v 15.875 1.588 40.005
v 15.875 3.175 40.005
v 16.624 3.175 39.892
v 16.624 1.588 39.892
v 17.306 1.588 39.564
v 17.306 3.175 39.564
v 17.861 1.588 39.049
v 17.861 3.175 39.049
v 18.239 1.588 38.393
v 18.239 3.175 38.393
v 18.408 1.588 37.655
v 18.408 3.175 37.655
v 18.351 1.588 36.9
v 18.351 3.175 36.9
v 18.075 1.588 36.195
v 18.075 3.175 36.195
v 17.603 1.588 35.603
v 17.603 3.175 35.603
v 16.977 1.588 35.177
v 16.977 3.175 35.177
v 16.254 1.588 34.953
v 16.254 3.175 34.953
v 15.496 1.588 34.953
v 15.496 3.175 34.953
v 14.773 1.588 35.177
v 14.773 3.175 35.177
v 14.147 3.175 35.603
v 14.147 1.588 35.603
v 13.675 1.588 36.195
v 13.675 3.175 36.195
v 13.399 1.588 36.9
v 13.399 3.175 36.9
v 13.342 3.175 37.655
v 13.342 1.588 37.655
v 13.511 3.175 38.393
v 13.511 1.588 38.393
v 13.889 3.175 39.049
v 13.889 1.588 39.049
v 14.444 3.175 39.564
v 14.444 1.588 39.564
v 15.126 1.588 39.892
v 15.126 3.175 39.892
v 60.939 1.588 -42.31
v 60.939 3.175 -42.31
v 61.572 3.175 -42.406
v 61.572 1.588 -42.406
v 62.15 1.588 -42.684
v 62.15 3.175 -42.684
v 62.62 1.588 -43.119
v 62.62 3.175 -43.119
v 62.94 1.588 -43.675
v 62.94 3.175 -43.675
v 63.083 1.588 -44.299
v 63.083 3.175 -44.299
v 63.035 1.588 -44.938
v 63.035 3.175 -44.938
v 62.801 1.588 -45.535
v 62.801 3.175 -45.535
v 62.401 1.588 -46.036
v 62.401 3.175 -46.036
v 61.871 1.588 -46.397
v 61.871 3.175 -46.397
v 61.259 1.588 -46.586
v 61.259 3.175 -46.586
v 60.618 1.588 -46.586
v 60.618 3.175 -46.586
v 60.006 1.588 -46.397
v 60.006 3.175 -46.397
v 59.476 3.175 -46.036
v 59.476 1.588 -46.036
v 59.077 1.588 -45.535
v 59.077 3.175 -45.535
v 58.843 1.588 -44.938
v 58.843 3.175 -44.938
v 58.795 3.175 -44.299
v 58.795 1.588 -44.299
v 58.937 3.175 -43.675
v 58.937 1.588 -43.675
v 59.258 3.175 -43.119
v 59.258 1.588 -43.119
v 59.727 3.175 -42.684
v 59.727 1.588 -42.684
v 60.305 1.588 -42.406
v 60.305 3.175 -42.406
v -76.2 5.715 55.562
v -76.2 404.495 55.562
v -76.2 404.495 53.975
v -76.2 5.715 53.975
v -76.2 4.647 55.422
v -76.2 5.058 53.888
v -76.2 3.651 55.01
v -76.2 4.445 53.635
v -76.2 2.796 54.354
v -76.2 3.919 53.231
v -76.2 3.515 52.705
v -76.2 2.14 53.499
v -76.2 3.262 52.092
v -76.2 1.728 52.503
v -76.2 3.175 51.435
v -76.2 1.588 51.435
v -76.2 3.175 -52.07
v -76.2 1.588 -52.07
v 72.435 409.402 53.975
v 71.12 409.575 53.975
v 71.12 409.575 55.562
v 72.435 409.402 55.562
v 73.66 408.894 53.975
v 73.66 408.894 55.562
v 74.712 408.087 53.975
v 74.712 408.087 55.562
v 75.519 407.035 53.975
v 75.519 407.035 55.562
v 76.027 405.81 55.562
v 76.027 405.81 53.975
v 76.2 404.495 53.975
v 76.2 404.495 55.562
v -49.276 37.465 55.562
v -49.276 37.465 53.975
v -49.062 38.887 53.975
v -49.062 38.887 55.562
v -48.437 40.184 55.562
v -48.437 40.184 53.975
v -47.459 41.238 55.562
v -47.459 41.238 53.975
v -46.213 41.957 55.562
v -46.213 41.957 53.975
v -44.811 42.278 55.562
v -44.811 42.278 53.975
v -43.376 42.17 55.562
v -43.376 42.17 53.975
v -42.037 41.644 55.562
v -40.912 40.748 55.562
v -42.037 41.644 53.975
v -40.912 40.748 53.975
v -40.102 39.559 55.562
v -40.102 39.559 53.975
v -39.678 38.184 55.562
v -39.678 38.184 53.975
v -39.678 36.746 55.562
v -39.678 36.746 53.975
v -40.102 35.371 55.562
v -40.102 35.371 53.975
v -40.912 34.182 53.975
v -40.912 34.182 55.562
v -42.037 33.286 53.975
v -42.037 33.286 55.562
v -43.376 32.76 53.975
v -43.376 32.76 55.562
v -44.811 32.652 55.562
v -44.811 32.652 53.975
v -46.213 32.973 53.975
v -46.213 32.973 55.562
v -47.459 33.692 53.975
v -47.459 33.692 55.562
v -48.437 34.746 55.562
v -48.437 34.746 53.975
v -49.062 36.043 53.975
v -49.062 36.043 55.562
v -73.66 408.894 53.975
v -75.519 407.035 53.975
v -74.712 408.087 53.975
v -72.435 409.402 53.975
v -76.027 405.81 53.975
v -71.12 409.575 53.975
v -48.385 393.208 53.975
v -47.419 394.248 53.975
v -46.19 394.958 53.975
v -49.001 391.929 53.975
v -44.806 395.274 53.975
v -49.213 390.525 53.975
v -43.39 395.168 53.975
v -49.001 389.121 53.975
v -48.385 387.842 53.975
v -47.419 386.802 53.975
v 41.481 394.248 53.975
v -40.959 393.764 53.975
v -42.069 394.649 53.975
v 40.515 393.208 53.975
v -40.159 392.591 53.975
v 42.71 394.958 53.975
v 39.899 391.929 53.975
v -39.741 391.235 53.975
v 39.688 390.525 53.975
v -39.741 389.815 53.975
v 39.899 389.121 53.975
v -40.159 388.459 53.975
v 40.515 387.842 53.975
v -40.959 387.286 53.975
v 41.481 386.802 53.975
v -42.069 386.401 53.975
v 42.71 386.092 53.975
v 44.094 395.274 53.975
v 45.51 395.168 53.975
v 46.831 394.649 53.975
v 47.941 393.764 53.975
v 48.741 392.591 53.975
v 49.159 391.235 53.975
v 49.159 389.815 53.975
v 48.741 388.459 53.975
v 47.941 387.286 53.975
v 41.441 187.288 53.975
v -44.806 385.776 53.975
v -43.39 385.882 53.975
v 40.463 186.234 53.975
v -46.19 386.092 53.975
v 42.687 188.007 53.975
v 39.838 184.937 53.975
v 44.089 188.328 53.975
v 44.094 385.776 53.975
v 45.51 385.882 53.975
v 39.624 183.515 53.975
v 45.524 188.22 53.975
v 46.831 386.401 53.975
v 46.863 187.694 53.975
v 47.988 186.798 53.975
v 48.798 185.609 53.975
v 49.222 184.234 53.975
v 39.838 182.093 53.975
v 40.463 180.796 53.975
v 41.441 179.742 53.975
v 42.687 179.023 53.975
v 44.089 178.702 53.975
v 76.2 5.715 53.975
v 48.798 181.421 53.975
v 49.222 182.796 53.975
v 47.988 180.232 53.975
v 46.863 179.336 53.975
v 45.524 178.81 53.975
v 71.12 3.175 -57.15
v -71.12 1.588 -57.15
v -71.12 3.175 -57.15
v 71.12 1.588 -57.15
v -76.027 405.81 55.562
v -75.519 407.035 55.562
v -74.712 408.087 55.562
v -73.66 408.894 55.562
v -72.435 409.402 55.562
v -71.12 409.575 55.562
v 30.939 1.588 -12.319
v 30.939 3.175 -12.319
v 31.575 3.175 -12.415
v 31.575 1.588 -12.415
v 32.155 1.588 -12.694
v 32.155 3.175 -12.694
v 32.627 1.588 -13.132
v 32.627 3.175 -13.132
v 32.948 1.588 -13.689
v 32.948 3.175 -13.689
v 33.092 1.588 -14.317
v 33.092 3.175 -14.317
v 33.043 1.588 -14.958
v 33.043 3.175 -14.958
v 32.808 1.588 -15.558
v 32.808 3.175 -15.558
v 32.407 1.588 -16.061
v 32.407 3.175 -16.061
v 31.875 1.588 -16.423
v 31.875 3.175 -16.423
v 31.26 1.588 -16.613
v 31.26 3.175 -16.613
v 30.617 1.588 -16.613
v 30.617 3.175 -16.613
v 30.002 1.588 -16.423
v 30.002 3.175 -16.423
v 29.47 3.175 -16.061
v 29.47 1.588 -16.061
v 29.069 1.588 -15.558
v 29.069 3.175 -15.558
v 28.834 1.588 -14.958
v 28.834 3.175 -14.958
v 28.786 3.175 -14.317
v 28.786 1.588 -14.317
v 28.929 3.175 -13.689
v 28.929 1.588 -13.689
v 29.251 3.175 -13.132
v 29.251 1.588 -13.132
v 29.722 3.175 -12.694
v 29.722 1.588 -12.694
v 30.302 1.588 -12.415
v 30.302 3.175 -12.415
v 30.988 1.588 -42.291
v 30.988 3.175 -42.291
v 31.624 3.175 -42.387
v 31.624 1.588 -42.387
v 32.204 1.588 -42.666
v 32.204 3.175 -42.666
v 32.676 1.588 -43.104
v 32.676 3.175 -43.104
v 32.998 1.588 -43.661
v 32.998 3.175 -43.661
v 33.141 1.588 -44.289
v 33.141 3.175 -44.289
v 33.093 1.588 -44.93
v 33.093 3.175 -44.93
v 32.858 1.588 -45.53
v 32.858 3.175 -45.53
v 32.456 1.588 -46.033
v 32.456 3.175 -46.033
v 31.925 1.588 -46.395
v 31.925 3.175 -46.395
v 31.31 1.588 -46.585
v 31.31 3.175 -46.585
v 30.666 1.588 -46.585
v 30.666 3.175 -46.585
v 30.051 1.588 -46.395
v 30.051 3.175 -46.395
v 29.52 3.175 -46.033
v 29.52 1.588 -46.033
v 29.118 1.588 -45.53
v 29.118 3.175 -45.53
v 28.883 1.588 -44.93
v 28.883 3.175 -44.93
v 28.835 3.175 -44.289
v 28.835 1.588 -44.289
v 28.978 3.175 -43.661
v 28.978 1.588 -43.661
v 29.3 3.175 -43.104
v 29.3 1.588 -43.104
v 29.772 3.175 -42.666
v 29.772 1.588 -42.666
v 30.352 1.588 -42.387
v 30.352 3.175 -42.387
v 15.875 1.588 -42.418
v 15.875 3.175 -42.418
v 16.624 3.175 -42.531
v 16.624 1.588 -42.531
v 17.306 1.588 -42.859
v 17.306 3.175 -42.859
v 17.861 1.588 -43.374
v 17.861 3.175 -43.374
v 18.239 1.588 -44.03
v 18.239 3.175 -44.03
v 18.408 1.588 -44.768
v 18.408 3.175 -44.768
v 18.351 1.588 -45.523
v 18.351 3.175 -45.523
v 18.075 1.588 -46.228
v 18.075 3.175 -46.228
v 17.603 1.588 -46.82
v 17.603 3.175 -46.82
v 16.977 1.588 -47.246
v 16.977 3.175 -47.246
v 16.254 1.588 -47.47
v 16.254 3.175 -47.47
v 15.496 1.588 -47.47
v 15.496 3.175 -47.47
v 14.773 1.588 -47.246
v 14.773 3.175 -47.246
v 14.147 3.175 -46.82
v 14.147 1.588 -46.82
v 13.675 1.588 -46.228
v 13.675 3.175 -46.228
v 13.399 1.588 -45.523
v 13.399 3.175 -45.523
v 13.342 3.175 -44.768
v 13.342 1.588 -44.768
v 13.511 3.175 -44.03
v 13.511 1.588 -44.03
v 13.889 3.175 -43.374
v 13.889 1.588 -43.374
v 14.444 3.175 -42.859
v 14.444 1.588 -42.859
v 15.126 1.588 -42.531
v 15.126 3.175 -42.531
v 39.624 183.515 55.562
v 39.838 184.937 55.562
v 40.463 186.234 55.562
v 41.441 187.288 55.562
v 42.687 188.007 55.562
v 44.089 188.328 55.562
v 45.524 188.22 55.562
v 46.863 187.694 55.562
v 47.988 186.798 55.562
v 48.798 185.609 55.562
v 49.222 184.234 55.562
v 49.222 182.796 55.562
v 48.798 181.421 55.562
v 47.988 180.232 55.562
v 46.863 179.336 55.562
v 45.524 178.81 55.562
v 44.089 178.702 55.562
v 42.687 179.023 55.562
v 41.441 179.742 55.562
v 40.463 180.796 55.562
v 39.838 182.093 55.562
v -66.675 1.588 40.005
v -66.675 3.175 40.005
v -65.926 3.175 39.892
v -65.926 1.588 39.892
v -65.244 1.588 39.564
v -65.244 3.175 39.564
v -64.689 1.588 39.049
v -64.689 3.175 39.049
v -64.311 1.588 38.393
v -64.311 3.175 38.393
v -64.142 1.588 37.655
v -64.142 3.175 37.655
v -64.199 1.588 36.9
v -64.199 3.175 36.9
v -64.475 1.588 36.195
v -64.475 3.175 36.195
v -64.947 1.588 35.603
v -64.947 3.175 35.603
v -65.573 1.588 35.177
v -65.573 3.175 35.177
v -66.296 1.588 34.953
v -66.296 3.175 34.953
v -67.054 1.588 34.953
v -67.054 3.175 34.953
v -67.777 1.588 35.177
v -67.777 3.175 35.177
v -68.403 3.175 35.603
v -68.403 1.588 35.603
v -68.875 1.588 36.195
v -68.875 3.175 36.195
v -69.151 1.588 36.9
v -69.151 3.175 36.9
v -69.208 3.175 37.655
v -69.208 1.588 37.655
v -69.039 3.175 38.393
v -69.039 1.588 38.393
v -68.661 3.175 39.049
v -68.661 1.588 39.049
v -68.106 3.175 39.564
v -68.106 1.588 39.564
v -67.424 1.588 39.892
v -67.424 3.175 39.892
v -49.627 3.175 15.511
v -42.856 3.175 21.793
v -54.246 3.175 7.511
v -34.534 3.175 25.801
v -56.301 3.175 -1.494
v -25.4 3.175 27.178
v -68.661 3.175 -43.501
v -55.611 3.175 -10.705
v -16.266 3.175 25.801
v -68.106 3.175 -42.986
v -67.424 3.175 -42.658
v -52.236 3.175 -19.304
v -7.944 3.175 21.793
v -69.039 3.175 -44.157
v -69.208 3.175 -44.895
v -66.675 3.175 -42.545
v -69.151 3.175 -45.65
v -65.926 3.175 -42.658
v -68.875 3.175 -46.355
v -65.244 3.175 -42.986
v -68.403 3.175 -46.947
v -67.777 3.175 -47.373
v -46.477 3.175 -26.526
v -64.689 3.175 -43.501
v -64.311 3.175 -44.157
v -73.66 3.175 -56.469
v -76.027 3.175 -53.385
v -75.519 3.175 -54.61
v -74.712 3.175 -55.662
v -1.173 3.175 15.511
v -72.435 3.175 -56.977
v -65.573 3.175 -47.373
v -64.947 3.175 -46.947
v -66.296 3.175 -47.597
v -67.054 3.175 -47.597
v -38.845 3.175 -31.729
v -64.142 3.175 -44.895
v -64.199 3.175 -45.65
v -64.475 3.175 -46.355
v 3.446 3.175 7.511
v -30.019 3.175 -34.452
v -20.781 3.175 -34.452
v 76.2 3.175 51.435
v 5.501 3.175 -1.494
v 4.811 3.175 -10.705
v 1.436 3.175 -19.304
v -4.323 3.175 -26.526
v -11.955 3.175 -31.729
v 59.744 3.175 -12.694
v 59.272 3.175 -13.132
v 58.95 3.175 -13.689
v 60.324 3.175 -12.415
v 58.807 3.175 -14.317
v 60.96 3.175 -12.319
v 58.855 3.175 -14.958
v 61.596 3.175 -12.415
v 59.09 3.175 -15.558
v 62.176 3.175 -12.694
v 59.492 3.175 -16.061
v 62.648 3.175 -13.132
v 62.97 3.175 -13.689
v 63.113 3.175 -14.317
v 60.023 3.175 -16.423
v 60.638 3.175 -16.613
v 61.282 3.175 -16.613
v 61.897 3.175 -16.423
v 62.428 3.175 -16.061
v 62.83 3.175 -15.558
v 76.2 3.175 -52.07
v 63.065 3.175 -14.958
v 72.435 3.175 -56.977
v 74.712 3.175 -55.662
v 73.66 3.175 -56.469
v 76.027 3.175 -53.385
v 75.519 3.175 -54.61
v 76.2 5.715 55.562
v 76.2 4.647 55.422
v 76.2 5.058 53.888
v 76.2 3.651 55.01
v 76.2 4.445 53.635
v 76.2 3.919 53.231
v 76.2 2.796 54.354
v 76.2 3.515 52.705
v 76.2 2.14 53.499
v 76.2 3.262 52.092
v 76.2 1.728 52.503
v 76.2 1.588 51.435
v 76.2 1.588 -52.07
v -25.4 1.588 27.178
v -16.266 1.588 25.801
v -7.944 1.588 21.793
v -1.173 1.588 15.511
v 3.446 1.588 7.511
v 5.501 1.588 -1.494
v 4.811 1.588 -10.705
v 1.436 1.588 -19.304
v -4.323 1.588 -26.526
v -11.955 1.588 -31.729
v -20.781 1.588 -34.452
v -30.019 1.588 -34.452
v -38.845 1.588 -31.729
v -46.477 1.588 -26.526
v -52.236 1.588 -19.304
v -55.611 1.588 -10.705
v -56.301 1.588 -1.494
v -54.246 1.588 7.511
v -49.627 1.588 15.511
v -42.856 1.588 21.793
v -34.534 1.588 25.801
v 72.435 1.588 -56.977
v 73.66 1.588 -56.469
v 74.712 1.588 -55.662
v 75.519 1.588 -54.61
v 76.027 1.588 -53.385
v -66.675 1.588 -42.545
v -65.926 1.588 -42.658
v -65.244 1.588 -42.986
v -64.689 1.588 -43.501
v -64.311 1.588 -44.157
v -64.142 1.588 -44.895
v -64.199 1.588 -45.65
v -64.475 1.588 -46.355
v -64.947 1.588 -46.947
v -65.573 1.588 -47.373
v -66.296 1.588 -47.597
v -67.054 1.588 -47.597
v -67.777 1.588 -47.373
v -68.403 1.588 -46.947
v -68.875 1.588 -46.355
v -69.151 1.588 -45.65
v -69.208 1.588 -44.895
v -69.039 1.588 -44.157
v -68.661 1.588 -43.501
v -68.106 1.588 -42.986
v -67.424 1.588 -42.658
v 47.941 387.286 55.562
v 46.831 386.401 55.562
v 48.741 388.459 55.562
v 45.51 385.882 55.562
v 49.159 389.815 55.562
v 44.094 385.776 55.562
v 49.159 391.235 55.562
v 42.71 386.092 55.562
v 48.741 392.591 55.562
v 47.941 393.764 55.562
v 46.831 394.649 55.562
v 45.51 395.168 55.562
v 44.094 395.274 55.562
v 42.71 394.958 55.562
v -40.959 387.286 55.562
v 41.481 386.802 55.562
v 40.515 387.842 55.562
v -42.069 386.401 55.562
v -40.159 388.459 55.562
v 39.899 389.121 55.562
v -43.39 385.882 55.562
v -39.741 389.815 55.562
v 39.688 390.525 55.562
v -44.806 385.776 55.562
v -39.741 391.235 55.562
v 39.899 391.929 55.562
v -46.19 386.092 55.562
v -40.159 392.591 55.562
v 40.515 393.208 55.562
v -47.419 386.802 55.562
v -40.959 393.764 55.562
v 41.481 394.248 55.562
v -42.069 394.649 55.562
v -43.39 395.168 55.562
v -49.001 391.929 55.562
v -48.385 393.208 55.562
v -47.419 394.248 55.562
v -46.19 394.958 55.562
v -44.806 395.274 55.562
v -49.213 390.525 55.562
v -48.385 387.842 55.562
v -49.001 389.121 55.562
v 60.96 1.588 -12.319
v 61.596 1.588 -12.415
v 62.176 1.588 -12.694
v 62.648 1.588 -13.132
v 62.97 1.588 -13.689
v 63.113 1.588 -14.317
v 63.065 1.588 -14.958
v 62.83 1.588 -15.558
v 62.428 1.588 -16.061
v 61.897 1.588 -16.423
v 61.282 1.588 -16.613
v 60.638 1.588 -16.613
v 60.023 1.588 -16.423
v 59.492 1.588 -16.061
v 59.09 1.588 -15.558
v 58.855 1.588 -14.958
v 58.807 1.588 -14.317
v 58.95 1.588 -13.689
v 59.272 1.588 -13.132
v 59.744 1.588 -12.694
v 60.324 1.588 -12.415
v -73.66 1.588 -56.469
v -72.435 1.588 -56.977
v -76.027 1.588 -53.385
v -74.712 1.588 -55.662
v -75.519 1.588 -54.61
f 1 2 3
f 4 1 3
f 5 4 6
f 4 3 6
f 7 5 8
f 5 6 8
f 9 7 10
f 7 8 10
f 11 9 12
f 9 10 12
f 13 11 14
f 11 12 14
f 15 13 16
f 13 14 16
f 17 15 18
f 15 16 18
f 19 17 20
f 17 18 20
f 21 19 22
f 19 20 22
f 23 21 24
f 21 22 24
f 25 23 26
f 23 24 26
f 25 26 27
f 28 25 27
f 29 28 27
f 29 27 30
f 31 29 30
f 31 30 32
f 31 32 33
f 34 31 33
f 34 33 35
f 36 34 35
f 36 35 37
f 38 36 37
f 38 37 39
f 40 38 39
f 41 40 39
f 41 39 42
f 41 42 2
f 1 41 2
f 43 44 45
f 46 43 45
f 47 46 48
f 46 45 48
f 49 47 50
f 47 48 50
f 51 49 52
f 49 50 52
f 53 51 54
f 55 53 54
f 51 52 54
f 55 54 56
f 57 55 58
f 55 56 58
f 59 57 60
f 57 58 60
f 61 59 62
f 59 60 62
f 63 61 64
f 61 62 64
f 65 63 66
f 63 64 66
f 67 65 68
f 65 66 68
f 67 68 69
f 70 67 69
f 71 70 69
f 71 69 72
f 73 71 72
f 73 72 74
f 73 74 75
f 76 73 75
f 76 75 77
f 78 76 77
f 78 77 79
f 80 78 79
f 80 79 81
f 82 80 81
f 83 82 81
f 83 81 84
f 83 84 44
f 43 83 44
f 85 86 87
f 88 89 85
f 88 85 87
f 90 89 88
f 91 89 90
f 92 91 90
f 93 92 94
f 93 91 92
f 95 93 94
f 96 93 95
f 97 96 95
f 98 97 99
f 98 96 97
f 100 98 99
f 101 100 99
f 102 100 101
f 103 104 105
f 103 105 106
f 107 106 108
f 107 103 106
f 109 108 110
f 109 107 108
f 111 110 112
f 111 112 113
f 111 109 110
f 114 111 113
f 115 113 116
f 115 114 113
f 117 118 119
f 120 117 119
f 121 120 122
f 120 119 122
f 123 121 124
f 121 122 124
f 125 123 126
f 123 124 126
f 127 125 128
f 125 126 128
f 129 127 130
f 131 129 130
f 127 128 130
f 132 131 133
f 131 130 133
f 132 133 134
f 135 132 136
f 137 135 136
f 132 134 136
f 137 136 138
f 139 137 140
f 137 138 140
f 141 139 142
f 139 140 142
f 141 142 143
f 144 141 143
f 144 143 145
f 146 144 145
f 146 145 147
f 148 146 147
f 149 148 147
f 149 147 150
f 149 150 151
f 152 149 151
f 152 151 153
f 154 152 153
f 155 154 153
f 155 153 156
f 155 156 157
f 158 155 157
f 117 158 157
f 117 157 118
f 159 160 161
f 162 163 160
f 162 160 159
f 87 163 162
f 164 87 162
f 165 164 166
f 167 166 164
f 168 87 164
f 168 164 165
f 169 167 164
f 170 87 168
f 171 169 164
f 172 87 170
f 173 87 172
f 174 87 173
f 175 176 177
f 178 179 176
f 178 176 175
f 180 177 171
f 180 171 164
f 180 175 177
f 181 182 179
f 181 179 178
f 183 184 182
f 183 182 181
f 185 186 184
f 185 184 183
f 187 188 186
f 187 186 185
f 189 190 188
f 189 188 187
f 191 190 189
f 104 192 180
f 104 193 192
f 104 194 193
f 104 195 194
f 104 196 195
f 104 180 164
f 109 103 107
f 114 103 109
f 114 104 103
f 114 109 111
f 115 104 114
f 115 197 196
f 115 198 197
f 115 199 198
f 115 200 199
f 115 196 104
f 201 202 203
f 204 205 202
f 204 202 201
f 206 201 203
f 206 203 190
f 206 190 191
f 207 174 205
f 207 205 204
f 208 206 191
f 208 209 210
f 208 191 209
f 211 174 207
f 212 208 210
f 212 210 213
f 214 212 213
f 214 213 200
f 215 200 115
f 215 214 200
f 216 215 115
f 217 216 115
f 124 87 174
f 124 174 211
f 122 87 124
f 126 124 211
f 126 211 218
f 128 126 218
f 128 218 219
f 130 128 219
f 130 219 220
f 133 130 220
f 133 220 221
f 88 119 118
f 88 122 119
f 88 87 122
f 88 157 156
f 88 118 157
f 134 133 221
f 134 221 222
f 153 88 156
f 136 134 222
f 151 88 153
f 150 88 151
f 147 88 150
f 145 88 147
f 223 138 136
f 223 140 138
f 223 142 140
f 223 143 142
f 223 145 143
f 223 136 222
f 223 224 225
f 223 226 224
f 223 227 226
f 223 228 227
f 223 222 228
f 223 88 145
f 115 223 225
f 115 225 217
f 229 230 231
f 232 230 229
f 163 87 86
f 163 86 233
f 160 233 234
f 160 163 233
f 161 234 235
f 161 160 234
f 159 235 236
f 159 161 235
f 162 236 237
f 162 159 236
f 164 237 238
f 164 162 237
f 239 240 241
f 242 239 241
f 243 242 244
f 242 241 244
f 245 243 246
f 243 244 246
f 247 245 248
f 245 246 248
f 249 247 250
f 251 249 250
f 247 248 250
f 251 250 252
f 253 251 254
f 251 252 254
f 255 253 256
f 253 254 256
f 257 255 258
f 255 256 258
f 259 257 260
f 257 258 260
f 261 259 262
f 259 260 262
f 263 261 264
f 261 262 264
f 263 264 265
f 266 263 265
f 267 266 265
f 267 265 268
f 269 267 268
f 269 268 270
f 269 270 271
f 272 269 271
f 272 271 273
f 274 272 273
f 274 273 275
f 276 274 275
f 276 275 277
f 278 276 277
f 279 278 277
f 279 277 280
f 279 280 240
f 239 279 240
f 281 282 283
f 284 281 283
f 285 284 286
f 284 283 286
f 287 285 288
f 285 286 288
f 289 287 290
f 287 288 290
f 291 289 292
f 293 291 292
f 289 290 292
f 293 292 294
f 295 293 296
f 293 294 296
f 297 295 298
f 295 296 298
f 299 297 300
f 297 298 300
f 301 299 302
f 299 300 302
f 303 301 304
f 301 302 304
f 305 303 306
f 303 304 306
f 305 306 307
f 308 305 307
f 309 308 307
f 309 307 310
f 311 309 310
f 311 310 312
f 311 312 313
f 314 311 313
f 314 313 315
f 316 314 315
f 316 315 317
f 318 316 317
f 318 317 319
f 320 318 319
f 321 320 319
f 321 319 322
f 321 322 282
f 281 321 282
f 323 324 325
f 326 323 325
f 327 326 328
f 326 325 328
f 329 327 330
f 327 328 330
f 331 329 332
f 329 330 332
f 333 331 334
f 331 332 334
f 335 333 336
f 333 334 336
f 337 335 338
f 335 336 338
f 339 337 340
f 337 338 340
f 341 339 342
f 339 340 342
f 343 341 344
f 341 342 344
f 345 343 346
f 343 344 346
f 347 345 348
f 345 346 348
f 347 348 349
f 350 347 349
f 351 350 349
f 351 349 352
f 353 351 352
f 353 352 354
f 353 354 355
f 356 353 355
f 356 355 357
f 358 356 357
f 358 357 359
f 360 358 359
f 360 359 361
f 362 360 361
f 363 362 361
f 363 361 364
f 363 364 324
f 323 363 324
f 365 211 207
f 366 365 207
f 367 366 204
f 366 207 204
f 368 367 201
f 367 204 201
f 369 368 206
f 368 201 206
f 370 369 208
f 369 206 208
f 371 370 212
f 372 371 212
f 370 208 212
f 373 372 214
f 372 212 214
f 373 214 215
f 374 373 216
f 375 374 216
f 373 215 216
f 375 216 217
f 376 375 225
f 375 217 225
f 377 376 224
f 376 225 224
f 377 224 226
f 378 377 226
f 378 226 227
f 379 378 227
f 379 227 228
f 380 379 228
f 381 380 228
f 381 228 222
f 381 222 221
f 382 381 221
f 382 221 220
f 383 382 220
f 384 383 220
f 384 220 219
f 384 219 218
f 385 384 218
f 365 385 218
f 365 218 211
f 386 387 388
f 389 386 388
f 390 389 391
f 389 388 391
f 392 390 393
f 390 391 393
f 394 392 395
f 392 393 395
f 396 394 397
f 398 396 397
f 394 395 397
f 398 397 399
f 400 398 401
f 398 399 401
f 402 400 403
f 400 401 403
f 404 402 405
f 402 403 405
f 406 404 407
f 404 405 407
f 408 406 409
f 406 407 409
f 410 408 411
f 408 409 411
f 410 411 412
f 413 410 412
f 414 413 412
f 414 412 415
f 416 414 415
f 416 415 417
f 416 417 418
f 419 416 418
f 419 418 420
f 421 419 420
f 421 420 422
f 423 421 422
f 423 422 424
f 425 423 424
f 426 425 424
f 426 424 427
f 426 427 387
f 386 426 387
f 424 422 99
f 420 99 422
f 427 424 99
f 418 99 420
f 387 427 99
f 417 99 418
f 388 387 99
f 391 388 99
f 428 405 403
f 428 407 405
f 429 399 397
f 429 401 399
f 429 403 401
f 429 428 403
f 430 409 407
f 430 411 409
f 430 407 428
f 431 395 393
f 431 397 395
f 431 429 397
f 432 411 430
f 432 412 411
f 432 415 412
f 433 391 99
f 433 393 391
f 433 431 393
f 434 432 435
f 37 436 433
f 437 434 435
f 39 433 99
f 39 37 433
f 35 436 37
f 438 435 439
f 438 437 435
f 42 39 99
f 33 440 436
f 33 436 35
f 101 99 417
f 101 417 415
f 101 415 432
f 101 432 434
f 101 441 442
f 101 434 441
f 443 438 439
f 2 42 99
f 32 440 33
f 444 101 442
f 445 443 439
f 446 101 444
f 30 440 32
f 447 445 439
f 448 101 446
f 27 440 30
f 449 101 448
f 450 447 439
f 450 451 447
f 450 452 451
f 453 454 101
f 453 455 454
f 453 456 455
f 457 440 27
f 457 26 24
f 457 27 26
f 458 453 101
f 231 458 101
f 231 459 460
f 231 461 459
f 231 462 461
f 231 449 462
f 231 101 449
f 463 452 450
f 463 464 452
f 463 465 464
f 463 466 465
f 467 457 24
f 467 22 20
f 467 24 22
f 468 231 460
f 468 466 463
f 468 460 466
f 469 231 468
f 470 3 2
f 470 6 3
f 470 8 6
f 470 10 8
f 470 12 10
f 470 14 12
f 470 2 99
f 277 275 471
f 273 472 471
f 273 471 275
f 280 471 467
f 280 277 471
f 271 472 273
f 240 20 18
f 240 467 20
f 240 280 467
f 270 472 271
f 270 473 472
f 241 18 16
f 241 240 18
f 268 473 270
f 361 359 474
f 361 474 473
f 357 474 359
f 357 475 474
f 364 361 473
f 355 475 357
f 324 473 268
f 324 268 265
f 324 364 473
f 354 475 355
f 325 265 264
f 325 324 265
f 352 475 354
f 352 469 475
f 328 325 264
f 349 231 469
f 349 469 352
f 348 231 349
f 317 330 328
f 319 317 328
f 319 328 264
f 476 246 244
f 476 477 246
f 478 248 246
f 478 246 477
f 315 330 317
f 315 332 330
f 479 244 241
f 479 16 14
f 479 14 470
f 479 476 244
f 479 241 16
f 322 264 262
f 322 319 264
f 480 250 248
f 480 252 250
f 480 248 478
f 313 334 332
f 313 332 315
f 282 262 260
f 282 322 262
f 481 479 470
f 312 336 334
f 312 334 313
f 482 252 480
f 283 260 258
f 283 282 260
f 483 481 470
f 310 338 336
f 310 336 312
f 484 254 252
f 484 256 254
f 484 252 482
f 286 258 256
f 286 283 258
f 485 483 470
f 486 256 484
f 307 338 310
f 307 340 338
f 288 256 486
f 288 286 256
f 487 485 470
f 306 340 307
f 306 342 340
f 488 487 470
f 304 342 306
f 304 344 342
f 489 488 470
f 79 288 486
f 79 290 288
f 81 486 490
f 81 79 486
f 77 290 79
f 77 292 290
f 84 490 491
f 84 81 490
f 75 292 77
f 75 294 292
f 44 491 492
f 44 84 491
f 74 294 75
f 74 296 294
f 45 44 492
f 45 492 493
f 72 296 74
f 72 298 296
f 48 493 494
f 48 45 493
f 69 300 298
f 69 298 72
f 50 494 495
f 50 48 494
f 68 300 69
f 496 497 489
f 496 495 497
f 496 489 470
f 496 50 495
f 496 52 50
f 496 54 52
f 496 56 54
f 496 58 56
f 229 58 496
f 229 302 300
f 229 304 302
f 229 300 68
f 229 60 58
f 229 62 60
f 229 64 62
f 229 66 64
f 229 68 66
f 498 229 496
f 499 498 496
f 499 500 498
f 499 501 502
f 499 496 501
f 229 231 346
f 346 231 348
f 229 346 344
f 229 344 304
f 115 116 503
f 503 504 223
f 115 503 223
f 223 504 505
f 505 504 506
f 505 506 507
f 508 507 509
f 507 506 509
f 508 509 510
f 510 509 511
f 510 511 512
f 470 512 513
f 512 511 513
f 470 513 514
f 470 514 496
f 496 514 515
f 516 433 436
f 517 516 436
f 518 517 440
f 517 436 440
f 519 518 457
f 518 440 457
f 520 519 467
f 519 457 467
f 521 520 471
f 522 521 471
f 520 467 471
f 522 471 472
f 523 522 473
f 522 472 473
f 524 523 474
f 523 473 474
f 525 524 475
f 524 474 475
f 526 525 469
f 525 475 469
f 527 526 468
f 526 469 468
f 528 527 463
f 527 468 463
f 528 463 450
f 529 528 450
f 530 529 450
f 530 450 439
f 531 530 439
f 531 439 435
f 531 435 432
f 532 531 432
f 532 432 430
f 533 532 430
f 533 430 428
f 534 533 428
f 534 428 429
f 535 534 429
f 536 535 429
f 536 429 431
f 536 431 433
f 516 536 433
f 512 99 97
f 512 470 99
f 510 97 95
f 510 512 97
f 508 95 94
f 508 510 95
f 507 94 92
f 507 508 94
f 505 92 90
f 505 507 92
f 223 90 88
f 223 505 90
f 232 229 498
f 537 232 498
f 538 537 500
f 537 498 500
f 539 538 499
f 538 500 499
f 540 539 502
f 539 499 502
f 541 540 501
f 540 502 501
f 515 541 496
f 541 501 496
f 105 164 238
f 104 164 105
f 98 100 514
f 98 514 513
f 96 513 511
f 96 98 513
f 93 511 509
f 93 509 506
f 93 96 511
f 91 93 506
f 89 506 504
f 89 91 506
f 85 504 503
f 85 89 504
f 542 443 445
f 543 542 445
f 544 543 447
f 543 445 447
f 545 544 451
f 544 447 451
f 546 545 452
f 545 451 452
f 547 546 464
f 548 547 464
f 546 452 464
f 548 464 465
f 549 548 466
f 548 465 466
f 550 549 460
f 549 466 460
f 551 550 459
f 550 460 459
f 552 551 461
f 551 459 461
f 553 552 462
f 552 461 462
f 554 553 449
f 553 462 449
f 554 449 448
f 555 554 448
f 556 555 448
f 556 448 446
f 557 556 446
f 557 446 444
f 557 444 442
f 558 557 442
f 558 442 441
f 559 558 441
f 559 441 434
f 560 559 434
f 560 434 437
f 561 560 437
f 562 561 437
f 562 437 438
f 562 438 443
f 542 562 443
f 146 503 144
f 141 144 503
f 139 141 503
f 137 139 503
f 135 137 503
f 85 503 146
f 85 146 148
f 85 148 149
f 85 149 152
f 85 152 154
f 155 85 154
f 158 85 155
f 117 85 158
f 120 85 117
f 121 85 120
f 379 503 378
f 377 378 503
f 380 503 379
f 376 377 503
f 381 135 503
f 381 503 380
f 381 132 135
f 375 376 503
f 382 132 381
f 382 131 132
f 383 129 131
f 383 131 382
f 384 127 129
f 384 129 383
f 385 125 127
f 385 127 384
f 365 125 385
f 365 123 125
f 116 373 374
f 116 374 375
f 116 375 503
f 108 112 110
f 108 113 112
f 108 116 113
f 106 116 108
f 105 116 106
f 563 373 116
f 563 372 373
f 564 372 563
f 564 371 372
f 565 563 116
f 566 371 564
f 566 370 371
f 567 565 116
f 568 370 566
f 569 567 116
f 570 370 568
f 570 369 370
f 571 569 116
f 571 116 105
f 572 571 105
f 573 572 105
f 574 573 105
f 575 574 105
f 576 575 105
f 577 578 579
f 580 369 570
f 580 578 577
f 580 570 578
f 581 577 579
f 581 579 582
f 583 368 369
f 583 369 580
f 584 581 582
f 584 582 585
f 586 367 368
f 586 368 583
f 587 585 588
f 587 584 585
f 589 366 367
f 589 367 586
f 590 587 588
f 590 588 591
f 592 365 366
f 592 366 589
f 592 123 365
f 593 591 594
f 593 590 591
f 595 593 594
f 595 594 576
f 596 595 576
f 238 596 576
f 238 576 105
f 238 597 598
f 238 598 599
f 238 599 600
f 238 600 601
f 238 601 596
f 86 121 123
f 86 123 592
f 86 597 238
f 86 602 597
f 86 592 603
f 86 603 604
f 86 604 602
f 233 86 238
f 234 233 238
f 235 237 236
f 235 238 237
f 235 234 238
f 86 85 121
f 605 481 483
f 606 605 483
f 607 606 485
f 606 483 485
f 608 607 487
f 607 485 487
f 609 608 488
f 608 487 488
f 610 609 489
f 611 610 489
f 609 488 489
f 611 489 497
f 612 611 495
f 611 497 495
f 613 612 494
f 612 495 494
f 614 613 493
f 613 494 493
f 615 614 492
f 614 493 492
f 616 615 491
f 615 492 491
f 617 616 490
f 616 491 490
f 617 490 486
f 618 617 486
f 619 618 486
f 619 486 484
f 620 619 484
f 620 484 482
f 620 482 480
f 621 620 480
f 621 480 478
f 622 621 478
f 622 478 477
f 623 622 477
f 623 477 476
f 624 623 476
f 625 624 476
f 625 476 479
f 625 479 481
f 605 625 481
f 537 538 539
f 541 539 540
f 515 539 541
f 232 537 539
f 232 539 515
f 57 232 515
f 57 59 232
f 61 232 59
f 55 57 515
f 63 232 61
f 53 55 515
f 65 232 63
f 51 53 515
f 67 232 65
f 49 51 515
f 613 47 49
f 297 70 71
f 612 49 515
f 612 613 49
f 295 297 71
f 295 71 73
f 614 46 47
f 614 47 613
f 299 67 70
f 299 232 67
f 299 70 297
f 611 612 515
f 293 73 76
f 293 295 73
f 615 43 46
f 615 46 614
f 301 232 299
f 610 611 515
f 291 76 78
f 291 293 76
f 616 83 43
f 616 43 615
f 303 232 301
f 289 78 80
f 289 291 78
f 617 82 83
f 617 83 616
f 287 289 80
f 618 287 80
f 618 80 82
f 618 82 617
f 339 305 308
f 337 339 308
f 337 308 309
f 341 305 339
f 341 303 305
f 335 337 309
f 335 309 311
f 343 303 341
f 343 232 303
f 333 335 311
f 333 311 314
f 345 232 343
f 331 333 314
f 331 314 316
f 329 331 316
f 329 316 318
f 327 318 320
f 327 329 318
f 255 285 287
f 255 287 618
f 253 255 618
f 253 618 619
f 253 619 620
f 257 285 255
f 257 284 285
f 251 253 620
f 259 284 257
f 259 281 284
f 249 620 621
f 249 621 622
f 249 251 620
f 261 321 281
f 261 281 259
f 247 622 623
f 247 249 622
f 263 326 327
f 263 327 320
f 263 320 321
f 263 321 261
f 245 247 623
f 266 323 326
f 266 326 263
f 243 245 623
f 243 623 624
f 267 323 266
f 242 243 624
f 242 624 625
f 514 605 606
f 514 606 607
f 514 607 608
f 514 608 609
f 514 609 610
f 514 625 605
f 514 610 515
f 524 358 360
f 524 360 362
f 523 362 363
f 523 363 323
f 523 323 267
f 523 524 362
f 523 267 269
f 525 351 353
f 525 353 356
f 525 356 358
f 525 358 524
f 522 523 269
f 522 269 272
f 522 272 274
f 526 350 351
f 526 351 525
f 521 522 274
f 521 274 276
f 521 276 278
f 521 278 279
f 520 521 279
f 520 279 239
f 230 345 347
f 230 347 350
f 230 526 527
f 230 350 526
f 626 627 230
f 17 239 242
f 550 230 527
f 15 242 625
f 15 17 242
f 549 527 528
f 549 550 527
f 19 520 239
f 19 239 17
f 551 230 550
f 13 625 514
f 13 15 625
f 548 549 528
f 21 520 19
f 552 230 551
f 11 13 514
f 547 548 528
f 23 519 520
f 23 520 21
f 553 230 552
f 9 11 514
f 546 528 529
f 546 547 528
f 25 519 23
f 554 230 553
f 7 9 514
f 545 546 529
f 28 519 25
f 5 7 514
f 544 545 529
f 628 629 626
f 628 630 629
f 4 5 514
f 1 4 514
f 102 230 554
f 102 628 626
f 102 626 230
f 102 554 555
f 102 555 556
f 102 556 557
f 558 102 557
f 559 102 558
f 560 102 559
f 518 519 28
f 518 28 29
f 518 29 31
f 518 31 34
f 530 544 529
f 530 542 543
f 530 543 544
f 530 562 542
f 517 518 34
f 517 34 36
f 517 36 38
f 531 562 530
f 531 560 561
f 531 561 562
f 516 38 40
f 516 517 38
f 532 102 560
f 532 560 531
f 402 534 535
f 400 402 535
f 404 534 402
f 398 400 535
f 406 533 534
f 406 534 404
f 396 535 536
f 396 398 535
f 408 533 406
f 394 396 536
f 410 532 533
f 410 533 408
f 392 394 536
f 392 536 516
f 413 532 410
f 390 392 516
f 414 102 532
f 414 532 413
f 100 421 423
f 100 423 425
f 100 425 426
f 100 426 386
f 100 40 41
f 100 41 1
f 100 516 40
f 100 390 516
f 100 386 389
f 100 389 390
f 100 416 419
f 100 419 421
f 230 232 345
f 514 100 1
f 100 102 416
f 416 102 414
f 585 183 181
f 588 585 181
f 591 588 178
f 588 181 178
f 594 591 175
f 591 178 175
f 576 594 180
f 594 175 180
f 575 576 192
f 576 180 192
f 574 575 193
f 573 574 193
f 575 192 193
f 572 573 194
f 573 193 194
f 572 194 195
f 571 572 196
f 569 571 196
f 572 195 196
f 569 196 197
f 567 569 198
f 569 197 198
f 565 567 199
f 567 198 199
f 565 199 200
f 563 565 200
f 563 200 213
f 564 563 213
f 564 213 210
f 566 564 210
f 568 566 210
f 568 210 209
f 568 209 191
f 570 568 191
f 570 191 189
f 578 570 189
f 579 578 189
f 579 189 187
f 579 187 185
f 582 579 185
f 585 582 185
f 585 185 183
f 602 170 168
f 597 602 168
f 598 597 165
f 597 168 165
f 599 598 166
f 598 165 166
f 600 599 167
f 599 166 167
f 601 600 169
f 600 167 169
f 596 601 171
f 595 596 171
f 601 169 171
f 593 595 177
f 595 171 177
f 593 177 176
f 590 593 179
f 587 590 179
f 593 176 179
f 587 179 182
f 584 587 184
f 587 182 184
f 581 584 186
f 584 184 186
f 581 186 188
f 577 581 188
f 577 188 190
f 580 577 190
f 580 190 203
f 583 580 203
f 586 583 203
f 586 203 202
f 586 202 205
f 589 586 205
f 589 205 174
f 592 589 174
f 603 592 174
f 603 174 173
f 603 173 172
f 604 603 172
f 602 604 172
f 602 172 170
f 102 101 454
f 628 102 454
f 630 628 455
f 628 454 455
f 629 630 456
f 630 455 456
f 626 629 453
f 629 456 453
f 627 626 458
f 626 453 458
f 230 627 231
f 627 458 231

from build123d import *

# Parameters (mm, degrees)
SKETCH1_W            = 152.4
SKETCH1_H            = 114.3
BOSS_EXTRUDE1_DEPTH  = 3.175
SKETCH2_W            = 152.4
SKETCH2_H            = 3.175
BOSS_EXTRUDE2_DEPTH  = 406.4
FILLET1_R            = 2.54
FILLET2_R            = 5.08
SKETCH3_R            = 30.988
SKETCH3_R_2          = 2.54
SKETCH3_R_3          = 2.159
SKETCH3_R_4          = 2.15
CUT_EXTRUDE1_DEPTH   = 418.41289211
CONVERT_SOLID1_START = -76.2
CONVERT_SOLID1_DEPTH = 152.4
SKETCH4_R            = 4.7625
SKETCH4_R_2          = 4.826
CUT_EXTRUDE2_DEPTH   = 432.169208374


# Read off the part's stored shape, not the designer's step: Convert-Solid1
with BuildPart() as part:
    # Sketch1 → Boss-Extrude1 (new body)
    with BuildSketch(Plane(origin=(0, 0, 0), x_dir=(1, 0, 0), z_dir=(0, 1, 0))):
        Rectangle(SKETCH1_W, SKETCH1_H)
    extrude(amount=BOSS_EXTRUDE1_DEPTH)

    # Sketch2 → Boss-Extrude2 (add)
    with BuildSketch(Plane(origin=(0, 3.175, 0), x_dir=(1, 0, 0), z_dir=(0, 1, 0))):
        with Locations((0, -55.5625)):
            Rectangle(SKETCH2_W, SKETCH2_H)
    extrude(amount=BOSS_EXTRUDE2_DEPTH)

    # Fillet1
    fillet1_edges = [part.edges().sort_by_distance(p)[0] for p in [
        (0, 3.175, 53.975),
        (0, 0, 57.15),
    ]]
    fillet(fillet1_edges, radius=FILLET1_R)

    # Fillet2
    fillet2_edges = [part.edges().sort_by_distance(p)[0] for p in [
        (-76.2, 409.575, 55.5625),
        (76.2, 409.575, 55.5625),
        (-76.2, 1.5875, -57.15),
        (76.2, 1.5875, -57.15),
    ]]
    fillet(fillet2_edges, radius=FILLET2_R)

    # Sketch3 → Cut-Extrude1 (cut, through all)
    with BuildSketch(Plane(origin=(0, 3.175, 0), x_dir=(1, 0, 0), z_dir=(0, 1, 0))):
        with Locations(Location((-25.4, 3.81, 0), (0, 0, 270))):
            Circle(SKETCH3_R)
        with Locations(Location((15.875, 44.958, 0), (0, 0, 270))):
            Circle(SKETCH3_R_2)
        with Locations(Location((-66.675, -37.465, 0), (0, 0, 270))):
            Circle(SKETCH3_R_2)
        with Locations(Location((15.875, -37.465, 0), (0, 0, 270))):
            Circle(SKETCH3_R_2)
        with Locations(Location((30.988, 44.45, 0), (0, 0, 270))):
            Circle(SKETCH3_R_3)
        with Locations(Location((60.93860251, 44.46, 0), (0, 0, 270))):
            Circle(SKETCH3_R_4)
        with Locations(Location((60.96, 14.478, 0), (0, 0, 270))):
            Circle(SKETCH3_R_3)
        with Locations(Location((30.93860251, 14.478, 0), (0, 0, 270))):
            Circle(SKETCH3_R_3)
        with Locations(Location((-66.675, 45.085, 0), (0, 0, 270))):
            Circle(SKETCH3_R_2)
    extrude(amount=-CUT_EXTRUDE1_DEPTH, mode=Mode.SUBTRACT)

    # Convert-Solid1 outline → Convert-Solid1 (cut)
    with BuildSketch(Plane.YZ.offset(CONVERT_SOLID1_START)):
        with BuildLine():
            Line((1.5875, -57.15), (1.5875, 51.435))
            ThreePointArc((1.5875, 51.435), (2.796416761, 54.353583239), (5.715, 55.5625))
            Line((5.715, 55.5625), (409.575, 55.5625))
            Line((409.575, 55.5625), (409.575, 57.15))
            Line((409.575, 57.15), (2.54, 57.15))
            ThreePointArc((2.54, 57.15), (0.743948776, 56.406051224), (0, 54.61))
            Line((0, 54.61), (0, -57.15))
            Line((0, -57.15), (1.5875, -57.15))
        make_face()
    extrude(amount=CONVERT_SOLID1_DEPTH, mode=Mode.SUBTRACT)

    # Sketch4 → Cut-Extrude2 (cut, through all)
    with BuildSketch(Plane(origin=(0, 0, 53.975), x_dir=(-1, 0, 0), z_dir=(0, 0, -1))):
        with Locations((-44.45, 390.525)):
            Circle(SKETCH4_R)
        with Locations((44.45, 390.525)):
            Circle(SKETCH4_R)
        with Locations((-44.45, 183.515)):
            Circle(SKETCH4_R_2)
        with Locations((44.45, 37.465)):
            Circle(SKETCH4_R_2)
    extrude(amount=-CUT_EXTRUDE2_DEPTH, mode=Mode.SUBTRACT)


solid = part.part
